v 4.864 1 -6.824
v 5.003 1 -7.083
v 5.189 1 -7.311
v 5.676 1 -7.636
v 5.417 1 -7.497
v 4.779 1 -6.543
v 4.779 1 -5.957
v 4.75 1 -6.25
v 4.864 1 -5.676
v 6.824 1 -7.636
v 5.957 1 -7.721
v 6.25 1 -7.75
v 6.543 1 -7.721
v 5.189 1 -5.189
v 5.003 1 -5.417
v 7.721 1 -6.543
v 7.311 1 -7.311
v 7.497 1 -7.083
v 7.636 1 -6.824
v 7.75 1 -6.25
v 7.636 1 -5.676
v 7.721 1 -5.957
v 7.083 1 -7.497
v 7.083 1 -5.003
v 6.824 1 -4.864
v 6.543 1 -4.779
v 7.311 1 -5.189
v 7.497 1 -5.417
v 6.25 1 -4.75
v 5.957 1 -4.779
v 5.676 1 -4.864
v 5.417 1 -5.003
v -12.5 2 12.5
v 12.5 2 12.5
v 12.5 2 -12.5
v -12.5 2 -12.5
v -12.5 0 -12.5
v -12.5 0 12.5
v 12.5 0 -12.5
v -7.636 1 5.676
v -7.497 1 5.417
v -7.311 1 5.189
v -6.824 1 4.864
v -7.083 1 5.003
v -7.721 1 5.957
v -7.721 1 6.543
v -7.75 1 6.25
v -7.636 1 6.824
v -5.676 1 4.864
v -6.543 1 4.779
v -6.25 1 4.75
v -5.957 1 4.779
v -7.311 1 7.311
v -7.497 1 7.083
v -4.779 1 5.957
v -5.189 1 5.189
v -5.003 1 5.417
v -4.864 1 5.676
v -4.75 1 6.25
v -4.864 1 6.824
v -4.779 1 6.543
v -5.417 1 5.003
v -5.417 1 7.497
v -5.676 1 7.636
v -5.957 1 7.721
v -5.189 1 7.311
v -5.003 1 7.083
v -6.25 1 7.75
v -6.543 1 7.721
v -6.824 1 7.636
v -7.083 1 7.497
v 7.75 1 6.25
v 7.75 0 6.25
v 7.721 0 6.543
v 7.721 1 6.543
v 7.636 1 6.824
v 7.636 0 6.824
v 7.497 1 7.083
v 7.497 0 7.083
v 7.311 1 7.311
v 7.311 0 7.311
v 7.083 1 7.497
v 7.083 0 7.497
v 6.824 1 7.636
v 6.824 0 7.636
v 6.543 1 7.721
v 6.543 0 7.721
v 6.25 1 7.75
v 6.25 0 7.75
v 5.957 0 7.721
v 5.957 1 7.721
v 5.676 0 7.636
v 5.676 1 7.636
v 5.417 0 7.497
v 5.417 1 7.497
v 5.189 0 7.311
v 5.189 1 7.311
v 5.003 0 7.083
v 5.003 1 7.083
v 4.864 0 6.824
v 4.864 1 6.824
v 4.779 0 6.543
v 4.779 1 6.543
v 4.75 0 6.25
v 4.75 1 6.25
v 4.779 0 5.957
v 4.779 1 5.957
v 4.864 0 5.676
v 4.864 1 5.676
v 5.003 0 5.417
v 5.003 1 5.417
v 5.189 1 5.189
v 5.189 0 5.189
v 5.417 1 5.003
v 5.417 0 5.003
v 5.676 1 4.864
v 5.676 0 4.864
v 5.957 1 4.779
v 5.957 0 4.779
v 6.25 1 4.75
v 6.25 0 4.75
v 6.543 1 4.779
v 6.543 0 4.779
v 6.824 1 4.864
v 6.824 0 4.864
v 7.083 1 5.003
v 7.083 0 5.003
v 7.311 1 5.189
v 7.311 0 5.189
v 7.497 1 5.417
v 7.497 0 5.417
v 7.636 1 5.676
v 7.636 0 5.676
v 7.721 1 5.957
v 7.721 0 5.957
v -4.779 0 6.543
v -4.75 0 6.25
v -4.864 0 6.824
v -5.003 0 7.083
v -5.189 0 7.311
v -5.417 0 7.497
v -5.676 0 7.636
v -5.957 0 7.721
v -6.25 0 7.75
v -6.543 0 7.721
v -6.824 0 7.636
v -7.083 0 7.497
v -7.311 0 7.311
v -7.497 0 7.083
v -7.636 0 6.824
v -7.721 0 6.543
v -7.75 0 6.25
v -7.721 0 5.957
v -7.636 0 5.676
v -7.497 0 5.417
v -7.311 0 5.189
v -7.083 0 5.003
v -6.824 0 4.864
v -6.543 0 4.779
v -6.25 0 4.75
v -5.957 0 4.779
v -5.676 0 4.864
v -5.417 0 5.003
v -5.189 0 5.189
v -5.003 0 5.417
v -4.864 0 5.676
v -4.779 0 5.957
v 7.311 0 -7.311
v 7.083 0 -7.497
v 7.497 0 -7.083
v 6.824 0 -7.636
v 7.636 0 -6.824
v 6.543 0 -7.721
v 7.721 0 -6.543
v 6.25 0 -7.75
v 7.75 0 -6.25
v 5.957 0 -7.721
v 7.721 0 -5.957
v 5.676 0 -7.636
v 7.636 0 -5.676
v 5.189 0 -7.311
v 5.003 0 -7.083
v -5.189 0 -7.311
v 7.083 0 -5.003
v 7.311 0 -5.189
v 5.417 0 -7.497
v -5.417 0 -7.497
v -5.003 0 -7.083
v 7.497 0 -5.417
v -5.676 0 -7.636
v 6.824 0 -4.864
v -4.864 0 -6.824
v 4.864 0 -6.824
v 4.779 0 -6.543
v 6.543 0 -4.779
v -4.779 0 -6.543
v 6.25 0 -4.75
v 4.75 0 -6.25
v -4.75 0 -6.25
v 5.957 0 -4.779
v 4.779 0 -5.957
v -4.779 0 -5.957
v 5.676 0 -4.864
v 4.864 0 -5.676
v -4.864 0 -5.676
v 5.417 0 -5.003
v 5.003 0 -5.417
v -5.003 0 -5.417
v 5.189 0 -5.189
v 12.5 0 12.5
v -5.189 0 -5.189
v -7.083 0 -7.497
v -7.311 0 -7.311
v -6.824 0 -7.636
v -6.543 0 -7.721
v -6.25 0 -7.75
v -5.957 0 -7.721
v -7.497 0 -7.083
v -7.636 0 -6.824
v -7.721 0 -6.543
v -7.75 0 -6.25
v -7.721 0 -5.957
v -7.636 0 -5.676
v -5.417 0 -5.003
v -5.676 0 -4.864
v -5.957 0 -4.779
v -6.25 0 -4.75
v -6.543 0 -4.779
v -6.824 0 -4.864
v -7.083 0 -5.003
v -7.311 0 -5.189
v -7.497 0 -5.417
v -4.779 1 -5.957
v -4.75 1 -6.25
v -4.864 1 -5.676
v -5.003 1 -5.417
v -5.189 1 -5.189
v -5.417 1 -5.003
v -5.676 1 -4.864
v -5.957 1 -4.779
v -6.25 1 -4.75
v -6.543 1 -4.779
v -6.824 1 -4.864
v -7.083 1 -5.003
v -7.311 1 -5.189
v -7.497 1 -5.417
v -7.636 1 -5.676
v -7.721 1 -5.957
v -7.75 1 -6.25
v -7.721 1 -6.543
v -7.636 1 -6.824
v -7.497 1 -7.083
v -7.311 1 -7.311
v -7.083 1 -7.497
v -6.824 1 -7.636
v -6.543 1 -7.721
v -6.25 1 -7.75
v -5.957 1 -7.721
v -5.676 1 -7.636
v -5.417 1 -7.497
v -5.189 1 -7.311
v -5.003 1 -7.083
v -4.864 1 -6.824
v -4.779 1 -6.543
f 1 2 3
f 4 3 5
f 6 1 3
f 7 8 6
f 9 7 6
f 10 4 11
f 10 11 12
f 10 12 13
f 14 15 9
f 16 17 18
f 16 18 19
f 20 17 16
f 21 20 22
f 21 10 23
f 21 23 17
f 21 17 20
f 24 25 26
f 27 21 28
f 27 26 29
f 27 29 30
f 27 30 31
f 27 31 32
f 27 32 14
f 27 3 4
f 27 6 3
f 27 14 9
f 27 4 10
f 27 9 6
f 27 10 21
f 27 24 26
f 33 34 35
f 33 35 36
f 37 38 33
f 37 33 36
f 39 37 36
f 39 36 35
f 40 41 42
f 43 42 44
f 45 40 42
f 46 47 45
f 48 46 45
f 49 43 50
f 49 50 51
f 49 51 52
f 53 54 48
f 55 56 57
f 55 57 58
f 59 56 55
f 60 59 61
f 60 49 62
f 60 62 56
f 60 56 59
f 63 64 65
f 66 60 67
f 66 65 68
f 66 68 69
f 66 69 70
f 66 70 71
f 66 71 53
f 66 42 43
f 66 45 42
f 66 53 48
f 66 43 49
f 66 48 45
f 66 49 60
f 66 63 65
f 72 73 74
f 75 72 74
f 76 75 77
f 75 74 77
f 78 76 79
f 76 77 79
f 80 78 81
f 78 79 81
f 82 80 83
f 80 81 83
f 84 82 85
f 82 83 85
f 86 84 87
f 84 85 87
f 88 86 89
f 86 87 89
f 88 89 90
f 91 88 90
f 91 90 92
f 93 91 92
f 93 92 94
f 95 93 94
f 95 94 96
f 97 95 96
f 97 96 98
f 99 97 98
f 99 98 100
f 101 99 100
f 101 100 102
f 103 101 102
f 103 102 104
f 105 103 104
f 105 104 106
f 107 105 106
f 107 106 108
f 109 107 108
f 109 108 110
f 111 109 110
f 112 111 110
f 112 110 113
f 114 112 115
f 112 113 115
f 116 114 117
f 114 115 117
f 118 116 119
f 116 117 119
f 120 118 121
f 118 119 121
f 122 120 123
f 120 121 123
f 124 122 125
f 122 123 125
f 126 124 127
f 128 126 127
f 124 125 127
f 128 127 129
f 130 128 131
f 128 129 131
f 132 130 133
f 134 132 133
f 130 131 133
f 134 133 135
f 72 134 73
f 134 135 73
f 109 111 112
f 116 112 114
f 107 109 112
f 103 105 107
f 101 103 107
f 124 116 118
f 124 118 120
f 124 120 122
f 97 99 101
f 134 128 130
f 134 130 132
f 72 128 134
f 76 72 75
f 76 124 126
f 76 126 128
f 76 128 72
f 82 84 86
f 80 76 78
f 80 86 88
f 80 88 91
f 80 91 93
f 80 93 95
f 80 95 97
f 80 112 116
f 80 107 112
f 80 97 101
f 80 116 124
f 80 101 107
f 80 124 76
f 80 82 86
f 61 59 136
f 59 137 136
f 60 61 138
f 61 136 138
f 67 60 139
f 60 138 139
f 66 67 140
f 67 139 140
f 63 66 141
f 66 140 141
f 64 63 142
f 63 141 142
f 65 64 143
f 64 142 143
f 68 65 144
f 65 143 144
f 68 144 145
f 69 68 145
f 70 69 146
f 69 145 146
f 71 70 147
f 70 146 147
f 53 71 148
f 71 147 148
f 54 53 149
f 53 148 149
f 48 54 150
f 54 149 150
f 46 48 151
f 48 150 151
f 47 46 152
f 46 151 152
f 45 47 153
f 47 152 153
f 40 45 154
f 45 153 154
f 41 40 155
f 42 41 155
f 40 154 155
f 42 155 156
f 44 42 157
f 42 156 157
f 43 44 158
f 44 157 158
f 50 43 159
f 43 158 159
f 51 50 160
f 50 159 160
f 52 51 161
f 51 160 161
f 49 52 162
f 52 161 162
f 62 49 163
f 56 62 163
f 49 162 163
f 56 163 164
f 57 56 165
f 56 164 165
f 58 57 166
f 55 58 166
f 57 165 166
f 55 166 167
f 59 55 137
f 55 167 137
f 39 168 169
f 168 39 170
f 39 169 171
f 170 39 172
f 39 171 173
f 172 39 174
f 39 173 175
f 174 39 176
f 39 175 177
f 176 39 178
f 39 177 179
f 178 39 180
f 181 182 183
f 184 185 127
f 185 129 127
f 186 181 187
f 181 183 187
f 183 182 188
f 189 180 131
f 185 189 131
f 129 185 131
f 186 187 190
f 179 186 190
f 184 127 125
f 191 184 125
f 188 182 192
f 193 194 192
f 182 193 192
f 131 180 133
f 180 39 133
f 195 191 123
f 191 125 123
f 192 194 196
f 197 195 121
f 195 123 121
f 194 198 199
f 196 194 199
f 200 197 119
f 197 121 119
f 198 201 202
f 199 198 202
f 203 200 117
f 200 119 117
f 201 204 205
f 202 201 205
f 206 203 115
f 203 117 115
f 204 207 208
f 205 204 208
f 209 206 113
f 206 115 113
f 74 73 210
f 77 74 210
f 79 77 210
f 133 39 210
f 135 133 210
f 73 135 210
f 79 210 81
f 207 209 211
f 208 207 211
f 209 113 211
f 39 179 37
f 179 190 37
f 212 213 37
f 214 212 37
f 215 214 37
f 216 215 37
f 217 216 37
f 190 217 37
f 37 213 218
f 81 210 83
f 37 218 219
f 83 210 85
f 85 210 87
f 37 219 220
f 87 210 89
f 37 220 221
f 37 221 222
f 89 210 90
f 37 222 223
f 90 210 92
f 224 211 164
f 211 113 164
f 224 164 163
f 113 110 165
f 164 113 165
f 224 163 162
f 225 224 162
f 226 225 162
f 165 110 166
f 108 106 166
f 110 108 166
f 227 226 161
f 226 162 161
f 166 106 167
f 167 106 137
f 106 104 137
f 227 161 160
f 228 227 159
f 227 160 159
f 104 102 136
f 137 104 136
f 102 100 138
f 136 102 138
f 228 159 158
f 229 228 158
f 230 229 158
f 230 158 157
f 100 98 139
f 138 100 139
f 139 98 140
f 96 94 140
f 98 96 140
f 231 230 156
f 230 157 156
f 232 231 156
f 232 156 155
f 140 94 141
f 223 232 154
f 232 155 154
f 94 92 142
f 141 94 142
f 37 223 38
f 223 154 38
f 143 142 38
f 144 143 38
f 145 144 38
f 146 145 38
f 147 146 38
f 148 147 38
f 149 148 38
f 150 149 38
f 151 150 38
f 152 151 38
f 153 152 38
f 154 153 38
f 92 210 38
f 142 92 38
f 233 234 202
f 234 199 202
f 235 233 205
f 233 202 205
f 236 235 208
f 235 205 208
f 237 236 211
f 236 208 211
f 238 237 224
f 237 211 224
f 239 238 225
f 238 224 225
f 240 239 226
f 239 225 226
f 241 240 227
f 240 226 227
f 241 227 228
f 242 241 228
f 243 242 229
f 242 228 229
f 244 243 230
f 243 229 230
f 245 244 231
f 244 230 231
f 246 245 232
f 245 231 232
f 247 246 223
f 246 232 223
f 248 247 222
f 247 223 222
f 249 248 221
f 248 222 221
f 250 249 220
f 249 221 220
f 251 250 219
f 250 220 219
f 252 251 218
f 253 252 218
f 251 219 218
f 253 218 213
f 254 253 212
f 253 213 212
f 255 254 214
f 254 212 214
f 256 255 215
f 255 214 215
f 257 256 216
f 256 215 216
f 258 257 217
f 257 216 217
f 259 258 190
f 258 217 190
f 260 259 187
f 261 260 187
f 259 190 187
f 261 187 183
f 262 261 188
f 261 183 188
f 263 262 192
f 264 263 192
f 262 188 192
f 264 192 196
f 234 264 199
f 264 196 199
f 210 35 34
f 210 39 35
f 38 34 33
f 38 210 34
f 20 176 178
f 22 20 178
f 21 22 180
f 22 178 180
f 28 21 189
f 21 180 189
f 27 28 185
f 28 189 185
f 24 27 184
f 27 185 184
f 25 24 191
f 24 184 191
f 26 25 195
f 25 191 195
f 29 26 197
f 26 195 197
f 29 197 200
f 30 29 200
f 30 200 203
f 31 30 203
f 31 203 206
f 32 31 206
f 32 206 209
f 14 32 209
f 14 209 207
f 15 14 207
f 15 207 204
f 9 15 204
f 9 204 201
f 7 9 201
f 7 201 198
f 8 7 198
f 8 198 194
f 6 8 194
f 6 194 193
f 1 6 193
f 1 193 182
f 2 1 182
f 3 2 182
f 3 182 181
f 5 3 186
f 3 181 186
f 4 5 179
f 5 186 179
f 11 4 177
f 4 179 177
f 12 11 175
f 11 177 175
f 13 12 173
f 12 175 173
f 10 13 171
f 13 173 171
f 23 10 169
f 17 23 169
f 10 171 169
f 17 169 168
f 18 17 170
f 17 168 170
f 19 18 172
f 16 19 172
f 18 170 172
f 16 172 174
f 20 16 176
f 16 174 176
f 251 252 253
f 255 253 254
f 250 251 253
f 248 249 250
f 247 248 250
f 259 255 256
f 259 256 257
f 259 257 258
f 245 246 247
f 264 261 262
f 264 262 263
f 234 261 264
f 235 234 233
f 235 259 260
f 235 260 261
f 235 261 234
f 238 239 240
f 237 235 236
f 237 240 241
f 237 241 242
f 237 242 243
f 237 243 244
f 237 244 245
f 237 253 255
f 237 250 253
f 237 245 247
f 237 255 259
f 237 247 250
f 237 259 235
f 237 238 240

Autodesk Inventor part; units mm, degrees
ref_plane "YZ Plane" through (0, 0, 0) normal (1, 0, 0) x (0, 1, 0)
ref_plane "XZ Plane" through (0, 0, 0) normal (0, 1, 0) x (-1, 0, 0)
ref_plane "XY Plane" through (0, 0, 0) normal (0, 0, 1) x (1, 0, 0)
sketch "Sketch1" plane through (0, 0, 0) normal (0, 1, 0) x (-1, 0, 0)
  line L0 (12.5, -12.5) -> (-12.5, -12.5)
  line L1 (-12.5, -12.5) -> (-12.5, 12.5)
  line L2 (-12.5, 12.5) -> (12.5, 12.5)
  line L3 (12.5, 12.5) -> (12.5, -12.5)
  line L4 (12.5, -12.5) -> (-12.5, 12.5) construction
  line L5 (-12.5, -12.5) -> (12.5, 12.5) construction
  point P0 (0, 0)
  dimension "d0" = 25
  dimension "d1" = 25
extrude "Extrusion1" add sketch "Sketch1" along normal blind 2
sketch "Sketch2" plane through (0, 0, 0) normal (0, -1, 0) x (1, 0, 0)
  line L0 (-12.5, -12.5) -> (-12.5, 12.5) construction
  line L1 (-12.5, 12.5) -> (0, 0) construction
  line L2 (-12.5, 0) -> (0, 12.5) construction
  line L3 (-12.5, 12.5) -> (12.5, 12.5) construction
  circle A0 centre (-6.25, 6.25) radius 1.5
  line L4 (0, 12.5) -> (0, 0) construction
  line L5 (0, 0) -> (-12.5, 0) construction
  circle A1 centre (6.25, 6.25) radius 1.5
  circle A2 centre (-6.25, -6.25) radius 1.5
  circle A3 centre (6.25, -6.25) radius 1.5
  dimension "d4" = 3
extrude "Extrusion2" cut sketch "Sketch2" against normal blind 1
equation "\"d0\" = 0.125 * chessboard_length"
equation "\"d1\" = 0.125 * chessboard_width"
equation "\"d2\" = square_thickness"
equation "\"d4\" = peg_diameter"
equation "\"d5\" = peg_height"
equation "\"square_thickness\" = 2"
equation "\"chessboard_length\" = 200"
equation "\"chessboard_width\" = 200"
equation "\"peg_diameter\" = 3"
equation "\"peg_height\" = 1"
properties part number "White Square" material "ABS Plastic"
